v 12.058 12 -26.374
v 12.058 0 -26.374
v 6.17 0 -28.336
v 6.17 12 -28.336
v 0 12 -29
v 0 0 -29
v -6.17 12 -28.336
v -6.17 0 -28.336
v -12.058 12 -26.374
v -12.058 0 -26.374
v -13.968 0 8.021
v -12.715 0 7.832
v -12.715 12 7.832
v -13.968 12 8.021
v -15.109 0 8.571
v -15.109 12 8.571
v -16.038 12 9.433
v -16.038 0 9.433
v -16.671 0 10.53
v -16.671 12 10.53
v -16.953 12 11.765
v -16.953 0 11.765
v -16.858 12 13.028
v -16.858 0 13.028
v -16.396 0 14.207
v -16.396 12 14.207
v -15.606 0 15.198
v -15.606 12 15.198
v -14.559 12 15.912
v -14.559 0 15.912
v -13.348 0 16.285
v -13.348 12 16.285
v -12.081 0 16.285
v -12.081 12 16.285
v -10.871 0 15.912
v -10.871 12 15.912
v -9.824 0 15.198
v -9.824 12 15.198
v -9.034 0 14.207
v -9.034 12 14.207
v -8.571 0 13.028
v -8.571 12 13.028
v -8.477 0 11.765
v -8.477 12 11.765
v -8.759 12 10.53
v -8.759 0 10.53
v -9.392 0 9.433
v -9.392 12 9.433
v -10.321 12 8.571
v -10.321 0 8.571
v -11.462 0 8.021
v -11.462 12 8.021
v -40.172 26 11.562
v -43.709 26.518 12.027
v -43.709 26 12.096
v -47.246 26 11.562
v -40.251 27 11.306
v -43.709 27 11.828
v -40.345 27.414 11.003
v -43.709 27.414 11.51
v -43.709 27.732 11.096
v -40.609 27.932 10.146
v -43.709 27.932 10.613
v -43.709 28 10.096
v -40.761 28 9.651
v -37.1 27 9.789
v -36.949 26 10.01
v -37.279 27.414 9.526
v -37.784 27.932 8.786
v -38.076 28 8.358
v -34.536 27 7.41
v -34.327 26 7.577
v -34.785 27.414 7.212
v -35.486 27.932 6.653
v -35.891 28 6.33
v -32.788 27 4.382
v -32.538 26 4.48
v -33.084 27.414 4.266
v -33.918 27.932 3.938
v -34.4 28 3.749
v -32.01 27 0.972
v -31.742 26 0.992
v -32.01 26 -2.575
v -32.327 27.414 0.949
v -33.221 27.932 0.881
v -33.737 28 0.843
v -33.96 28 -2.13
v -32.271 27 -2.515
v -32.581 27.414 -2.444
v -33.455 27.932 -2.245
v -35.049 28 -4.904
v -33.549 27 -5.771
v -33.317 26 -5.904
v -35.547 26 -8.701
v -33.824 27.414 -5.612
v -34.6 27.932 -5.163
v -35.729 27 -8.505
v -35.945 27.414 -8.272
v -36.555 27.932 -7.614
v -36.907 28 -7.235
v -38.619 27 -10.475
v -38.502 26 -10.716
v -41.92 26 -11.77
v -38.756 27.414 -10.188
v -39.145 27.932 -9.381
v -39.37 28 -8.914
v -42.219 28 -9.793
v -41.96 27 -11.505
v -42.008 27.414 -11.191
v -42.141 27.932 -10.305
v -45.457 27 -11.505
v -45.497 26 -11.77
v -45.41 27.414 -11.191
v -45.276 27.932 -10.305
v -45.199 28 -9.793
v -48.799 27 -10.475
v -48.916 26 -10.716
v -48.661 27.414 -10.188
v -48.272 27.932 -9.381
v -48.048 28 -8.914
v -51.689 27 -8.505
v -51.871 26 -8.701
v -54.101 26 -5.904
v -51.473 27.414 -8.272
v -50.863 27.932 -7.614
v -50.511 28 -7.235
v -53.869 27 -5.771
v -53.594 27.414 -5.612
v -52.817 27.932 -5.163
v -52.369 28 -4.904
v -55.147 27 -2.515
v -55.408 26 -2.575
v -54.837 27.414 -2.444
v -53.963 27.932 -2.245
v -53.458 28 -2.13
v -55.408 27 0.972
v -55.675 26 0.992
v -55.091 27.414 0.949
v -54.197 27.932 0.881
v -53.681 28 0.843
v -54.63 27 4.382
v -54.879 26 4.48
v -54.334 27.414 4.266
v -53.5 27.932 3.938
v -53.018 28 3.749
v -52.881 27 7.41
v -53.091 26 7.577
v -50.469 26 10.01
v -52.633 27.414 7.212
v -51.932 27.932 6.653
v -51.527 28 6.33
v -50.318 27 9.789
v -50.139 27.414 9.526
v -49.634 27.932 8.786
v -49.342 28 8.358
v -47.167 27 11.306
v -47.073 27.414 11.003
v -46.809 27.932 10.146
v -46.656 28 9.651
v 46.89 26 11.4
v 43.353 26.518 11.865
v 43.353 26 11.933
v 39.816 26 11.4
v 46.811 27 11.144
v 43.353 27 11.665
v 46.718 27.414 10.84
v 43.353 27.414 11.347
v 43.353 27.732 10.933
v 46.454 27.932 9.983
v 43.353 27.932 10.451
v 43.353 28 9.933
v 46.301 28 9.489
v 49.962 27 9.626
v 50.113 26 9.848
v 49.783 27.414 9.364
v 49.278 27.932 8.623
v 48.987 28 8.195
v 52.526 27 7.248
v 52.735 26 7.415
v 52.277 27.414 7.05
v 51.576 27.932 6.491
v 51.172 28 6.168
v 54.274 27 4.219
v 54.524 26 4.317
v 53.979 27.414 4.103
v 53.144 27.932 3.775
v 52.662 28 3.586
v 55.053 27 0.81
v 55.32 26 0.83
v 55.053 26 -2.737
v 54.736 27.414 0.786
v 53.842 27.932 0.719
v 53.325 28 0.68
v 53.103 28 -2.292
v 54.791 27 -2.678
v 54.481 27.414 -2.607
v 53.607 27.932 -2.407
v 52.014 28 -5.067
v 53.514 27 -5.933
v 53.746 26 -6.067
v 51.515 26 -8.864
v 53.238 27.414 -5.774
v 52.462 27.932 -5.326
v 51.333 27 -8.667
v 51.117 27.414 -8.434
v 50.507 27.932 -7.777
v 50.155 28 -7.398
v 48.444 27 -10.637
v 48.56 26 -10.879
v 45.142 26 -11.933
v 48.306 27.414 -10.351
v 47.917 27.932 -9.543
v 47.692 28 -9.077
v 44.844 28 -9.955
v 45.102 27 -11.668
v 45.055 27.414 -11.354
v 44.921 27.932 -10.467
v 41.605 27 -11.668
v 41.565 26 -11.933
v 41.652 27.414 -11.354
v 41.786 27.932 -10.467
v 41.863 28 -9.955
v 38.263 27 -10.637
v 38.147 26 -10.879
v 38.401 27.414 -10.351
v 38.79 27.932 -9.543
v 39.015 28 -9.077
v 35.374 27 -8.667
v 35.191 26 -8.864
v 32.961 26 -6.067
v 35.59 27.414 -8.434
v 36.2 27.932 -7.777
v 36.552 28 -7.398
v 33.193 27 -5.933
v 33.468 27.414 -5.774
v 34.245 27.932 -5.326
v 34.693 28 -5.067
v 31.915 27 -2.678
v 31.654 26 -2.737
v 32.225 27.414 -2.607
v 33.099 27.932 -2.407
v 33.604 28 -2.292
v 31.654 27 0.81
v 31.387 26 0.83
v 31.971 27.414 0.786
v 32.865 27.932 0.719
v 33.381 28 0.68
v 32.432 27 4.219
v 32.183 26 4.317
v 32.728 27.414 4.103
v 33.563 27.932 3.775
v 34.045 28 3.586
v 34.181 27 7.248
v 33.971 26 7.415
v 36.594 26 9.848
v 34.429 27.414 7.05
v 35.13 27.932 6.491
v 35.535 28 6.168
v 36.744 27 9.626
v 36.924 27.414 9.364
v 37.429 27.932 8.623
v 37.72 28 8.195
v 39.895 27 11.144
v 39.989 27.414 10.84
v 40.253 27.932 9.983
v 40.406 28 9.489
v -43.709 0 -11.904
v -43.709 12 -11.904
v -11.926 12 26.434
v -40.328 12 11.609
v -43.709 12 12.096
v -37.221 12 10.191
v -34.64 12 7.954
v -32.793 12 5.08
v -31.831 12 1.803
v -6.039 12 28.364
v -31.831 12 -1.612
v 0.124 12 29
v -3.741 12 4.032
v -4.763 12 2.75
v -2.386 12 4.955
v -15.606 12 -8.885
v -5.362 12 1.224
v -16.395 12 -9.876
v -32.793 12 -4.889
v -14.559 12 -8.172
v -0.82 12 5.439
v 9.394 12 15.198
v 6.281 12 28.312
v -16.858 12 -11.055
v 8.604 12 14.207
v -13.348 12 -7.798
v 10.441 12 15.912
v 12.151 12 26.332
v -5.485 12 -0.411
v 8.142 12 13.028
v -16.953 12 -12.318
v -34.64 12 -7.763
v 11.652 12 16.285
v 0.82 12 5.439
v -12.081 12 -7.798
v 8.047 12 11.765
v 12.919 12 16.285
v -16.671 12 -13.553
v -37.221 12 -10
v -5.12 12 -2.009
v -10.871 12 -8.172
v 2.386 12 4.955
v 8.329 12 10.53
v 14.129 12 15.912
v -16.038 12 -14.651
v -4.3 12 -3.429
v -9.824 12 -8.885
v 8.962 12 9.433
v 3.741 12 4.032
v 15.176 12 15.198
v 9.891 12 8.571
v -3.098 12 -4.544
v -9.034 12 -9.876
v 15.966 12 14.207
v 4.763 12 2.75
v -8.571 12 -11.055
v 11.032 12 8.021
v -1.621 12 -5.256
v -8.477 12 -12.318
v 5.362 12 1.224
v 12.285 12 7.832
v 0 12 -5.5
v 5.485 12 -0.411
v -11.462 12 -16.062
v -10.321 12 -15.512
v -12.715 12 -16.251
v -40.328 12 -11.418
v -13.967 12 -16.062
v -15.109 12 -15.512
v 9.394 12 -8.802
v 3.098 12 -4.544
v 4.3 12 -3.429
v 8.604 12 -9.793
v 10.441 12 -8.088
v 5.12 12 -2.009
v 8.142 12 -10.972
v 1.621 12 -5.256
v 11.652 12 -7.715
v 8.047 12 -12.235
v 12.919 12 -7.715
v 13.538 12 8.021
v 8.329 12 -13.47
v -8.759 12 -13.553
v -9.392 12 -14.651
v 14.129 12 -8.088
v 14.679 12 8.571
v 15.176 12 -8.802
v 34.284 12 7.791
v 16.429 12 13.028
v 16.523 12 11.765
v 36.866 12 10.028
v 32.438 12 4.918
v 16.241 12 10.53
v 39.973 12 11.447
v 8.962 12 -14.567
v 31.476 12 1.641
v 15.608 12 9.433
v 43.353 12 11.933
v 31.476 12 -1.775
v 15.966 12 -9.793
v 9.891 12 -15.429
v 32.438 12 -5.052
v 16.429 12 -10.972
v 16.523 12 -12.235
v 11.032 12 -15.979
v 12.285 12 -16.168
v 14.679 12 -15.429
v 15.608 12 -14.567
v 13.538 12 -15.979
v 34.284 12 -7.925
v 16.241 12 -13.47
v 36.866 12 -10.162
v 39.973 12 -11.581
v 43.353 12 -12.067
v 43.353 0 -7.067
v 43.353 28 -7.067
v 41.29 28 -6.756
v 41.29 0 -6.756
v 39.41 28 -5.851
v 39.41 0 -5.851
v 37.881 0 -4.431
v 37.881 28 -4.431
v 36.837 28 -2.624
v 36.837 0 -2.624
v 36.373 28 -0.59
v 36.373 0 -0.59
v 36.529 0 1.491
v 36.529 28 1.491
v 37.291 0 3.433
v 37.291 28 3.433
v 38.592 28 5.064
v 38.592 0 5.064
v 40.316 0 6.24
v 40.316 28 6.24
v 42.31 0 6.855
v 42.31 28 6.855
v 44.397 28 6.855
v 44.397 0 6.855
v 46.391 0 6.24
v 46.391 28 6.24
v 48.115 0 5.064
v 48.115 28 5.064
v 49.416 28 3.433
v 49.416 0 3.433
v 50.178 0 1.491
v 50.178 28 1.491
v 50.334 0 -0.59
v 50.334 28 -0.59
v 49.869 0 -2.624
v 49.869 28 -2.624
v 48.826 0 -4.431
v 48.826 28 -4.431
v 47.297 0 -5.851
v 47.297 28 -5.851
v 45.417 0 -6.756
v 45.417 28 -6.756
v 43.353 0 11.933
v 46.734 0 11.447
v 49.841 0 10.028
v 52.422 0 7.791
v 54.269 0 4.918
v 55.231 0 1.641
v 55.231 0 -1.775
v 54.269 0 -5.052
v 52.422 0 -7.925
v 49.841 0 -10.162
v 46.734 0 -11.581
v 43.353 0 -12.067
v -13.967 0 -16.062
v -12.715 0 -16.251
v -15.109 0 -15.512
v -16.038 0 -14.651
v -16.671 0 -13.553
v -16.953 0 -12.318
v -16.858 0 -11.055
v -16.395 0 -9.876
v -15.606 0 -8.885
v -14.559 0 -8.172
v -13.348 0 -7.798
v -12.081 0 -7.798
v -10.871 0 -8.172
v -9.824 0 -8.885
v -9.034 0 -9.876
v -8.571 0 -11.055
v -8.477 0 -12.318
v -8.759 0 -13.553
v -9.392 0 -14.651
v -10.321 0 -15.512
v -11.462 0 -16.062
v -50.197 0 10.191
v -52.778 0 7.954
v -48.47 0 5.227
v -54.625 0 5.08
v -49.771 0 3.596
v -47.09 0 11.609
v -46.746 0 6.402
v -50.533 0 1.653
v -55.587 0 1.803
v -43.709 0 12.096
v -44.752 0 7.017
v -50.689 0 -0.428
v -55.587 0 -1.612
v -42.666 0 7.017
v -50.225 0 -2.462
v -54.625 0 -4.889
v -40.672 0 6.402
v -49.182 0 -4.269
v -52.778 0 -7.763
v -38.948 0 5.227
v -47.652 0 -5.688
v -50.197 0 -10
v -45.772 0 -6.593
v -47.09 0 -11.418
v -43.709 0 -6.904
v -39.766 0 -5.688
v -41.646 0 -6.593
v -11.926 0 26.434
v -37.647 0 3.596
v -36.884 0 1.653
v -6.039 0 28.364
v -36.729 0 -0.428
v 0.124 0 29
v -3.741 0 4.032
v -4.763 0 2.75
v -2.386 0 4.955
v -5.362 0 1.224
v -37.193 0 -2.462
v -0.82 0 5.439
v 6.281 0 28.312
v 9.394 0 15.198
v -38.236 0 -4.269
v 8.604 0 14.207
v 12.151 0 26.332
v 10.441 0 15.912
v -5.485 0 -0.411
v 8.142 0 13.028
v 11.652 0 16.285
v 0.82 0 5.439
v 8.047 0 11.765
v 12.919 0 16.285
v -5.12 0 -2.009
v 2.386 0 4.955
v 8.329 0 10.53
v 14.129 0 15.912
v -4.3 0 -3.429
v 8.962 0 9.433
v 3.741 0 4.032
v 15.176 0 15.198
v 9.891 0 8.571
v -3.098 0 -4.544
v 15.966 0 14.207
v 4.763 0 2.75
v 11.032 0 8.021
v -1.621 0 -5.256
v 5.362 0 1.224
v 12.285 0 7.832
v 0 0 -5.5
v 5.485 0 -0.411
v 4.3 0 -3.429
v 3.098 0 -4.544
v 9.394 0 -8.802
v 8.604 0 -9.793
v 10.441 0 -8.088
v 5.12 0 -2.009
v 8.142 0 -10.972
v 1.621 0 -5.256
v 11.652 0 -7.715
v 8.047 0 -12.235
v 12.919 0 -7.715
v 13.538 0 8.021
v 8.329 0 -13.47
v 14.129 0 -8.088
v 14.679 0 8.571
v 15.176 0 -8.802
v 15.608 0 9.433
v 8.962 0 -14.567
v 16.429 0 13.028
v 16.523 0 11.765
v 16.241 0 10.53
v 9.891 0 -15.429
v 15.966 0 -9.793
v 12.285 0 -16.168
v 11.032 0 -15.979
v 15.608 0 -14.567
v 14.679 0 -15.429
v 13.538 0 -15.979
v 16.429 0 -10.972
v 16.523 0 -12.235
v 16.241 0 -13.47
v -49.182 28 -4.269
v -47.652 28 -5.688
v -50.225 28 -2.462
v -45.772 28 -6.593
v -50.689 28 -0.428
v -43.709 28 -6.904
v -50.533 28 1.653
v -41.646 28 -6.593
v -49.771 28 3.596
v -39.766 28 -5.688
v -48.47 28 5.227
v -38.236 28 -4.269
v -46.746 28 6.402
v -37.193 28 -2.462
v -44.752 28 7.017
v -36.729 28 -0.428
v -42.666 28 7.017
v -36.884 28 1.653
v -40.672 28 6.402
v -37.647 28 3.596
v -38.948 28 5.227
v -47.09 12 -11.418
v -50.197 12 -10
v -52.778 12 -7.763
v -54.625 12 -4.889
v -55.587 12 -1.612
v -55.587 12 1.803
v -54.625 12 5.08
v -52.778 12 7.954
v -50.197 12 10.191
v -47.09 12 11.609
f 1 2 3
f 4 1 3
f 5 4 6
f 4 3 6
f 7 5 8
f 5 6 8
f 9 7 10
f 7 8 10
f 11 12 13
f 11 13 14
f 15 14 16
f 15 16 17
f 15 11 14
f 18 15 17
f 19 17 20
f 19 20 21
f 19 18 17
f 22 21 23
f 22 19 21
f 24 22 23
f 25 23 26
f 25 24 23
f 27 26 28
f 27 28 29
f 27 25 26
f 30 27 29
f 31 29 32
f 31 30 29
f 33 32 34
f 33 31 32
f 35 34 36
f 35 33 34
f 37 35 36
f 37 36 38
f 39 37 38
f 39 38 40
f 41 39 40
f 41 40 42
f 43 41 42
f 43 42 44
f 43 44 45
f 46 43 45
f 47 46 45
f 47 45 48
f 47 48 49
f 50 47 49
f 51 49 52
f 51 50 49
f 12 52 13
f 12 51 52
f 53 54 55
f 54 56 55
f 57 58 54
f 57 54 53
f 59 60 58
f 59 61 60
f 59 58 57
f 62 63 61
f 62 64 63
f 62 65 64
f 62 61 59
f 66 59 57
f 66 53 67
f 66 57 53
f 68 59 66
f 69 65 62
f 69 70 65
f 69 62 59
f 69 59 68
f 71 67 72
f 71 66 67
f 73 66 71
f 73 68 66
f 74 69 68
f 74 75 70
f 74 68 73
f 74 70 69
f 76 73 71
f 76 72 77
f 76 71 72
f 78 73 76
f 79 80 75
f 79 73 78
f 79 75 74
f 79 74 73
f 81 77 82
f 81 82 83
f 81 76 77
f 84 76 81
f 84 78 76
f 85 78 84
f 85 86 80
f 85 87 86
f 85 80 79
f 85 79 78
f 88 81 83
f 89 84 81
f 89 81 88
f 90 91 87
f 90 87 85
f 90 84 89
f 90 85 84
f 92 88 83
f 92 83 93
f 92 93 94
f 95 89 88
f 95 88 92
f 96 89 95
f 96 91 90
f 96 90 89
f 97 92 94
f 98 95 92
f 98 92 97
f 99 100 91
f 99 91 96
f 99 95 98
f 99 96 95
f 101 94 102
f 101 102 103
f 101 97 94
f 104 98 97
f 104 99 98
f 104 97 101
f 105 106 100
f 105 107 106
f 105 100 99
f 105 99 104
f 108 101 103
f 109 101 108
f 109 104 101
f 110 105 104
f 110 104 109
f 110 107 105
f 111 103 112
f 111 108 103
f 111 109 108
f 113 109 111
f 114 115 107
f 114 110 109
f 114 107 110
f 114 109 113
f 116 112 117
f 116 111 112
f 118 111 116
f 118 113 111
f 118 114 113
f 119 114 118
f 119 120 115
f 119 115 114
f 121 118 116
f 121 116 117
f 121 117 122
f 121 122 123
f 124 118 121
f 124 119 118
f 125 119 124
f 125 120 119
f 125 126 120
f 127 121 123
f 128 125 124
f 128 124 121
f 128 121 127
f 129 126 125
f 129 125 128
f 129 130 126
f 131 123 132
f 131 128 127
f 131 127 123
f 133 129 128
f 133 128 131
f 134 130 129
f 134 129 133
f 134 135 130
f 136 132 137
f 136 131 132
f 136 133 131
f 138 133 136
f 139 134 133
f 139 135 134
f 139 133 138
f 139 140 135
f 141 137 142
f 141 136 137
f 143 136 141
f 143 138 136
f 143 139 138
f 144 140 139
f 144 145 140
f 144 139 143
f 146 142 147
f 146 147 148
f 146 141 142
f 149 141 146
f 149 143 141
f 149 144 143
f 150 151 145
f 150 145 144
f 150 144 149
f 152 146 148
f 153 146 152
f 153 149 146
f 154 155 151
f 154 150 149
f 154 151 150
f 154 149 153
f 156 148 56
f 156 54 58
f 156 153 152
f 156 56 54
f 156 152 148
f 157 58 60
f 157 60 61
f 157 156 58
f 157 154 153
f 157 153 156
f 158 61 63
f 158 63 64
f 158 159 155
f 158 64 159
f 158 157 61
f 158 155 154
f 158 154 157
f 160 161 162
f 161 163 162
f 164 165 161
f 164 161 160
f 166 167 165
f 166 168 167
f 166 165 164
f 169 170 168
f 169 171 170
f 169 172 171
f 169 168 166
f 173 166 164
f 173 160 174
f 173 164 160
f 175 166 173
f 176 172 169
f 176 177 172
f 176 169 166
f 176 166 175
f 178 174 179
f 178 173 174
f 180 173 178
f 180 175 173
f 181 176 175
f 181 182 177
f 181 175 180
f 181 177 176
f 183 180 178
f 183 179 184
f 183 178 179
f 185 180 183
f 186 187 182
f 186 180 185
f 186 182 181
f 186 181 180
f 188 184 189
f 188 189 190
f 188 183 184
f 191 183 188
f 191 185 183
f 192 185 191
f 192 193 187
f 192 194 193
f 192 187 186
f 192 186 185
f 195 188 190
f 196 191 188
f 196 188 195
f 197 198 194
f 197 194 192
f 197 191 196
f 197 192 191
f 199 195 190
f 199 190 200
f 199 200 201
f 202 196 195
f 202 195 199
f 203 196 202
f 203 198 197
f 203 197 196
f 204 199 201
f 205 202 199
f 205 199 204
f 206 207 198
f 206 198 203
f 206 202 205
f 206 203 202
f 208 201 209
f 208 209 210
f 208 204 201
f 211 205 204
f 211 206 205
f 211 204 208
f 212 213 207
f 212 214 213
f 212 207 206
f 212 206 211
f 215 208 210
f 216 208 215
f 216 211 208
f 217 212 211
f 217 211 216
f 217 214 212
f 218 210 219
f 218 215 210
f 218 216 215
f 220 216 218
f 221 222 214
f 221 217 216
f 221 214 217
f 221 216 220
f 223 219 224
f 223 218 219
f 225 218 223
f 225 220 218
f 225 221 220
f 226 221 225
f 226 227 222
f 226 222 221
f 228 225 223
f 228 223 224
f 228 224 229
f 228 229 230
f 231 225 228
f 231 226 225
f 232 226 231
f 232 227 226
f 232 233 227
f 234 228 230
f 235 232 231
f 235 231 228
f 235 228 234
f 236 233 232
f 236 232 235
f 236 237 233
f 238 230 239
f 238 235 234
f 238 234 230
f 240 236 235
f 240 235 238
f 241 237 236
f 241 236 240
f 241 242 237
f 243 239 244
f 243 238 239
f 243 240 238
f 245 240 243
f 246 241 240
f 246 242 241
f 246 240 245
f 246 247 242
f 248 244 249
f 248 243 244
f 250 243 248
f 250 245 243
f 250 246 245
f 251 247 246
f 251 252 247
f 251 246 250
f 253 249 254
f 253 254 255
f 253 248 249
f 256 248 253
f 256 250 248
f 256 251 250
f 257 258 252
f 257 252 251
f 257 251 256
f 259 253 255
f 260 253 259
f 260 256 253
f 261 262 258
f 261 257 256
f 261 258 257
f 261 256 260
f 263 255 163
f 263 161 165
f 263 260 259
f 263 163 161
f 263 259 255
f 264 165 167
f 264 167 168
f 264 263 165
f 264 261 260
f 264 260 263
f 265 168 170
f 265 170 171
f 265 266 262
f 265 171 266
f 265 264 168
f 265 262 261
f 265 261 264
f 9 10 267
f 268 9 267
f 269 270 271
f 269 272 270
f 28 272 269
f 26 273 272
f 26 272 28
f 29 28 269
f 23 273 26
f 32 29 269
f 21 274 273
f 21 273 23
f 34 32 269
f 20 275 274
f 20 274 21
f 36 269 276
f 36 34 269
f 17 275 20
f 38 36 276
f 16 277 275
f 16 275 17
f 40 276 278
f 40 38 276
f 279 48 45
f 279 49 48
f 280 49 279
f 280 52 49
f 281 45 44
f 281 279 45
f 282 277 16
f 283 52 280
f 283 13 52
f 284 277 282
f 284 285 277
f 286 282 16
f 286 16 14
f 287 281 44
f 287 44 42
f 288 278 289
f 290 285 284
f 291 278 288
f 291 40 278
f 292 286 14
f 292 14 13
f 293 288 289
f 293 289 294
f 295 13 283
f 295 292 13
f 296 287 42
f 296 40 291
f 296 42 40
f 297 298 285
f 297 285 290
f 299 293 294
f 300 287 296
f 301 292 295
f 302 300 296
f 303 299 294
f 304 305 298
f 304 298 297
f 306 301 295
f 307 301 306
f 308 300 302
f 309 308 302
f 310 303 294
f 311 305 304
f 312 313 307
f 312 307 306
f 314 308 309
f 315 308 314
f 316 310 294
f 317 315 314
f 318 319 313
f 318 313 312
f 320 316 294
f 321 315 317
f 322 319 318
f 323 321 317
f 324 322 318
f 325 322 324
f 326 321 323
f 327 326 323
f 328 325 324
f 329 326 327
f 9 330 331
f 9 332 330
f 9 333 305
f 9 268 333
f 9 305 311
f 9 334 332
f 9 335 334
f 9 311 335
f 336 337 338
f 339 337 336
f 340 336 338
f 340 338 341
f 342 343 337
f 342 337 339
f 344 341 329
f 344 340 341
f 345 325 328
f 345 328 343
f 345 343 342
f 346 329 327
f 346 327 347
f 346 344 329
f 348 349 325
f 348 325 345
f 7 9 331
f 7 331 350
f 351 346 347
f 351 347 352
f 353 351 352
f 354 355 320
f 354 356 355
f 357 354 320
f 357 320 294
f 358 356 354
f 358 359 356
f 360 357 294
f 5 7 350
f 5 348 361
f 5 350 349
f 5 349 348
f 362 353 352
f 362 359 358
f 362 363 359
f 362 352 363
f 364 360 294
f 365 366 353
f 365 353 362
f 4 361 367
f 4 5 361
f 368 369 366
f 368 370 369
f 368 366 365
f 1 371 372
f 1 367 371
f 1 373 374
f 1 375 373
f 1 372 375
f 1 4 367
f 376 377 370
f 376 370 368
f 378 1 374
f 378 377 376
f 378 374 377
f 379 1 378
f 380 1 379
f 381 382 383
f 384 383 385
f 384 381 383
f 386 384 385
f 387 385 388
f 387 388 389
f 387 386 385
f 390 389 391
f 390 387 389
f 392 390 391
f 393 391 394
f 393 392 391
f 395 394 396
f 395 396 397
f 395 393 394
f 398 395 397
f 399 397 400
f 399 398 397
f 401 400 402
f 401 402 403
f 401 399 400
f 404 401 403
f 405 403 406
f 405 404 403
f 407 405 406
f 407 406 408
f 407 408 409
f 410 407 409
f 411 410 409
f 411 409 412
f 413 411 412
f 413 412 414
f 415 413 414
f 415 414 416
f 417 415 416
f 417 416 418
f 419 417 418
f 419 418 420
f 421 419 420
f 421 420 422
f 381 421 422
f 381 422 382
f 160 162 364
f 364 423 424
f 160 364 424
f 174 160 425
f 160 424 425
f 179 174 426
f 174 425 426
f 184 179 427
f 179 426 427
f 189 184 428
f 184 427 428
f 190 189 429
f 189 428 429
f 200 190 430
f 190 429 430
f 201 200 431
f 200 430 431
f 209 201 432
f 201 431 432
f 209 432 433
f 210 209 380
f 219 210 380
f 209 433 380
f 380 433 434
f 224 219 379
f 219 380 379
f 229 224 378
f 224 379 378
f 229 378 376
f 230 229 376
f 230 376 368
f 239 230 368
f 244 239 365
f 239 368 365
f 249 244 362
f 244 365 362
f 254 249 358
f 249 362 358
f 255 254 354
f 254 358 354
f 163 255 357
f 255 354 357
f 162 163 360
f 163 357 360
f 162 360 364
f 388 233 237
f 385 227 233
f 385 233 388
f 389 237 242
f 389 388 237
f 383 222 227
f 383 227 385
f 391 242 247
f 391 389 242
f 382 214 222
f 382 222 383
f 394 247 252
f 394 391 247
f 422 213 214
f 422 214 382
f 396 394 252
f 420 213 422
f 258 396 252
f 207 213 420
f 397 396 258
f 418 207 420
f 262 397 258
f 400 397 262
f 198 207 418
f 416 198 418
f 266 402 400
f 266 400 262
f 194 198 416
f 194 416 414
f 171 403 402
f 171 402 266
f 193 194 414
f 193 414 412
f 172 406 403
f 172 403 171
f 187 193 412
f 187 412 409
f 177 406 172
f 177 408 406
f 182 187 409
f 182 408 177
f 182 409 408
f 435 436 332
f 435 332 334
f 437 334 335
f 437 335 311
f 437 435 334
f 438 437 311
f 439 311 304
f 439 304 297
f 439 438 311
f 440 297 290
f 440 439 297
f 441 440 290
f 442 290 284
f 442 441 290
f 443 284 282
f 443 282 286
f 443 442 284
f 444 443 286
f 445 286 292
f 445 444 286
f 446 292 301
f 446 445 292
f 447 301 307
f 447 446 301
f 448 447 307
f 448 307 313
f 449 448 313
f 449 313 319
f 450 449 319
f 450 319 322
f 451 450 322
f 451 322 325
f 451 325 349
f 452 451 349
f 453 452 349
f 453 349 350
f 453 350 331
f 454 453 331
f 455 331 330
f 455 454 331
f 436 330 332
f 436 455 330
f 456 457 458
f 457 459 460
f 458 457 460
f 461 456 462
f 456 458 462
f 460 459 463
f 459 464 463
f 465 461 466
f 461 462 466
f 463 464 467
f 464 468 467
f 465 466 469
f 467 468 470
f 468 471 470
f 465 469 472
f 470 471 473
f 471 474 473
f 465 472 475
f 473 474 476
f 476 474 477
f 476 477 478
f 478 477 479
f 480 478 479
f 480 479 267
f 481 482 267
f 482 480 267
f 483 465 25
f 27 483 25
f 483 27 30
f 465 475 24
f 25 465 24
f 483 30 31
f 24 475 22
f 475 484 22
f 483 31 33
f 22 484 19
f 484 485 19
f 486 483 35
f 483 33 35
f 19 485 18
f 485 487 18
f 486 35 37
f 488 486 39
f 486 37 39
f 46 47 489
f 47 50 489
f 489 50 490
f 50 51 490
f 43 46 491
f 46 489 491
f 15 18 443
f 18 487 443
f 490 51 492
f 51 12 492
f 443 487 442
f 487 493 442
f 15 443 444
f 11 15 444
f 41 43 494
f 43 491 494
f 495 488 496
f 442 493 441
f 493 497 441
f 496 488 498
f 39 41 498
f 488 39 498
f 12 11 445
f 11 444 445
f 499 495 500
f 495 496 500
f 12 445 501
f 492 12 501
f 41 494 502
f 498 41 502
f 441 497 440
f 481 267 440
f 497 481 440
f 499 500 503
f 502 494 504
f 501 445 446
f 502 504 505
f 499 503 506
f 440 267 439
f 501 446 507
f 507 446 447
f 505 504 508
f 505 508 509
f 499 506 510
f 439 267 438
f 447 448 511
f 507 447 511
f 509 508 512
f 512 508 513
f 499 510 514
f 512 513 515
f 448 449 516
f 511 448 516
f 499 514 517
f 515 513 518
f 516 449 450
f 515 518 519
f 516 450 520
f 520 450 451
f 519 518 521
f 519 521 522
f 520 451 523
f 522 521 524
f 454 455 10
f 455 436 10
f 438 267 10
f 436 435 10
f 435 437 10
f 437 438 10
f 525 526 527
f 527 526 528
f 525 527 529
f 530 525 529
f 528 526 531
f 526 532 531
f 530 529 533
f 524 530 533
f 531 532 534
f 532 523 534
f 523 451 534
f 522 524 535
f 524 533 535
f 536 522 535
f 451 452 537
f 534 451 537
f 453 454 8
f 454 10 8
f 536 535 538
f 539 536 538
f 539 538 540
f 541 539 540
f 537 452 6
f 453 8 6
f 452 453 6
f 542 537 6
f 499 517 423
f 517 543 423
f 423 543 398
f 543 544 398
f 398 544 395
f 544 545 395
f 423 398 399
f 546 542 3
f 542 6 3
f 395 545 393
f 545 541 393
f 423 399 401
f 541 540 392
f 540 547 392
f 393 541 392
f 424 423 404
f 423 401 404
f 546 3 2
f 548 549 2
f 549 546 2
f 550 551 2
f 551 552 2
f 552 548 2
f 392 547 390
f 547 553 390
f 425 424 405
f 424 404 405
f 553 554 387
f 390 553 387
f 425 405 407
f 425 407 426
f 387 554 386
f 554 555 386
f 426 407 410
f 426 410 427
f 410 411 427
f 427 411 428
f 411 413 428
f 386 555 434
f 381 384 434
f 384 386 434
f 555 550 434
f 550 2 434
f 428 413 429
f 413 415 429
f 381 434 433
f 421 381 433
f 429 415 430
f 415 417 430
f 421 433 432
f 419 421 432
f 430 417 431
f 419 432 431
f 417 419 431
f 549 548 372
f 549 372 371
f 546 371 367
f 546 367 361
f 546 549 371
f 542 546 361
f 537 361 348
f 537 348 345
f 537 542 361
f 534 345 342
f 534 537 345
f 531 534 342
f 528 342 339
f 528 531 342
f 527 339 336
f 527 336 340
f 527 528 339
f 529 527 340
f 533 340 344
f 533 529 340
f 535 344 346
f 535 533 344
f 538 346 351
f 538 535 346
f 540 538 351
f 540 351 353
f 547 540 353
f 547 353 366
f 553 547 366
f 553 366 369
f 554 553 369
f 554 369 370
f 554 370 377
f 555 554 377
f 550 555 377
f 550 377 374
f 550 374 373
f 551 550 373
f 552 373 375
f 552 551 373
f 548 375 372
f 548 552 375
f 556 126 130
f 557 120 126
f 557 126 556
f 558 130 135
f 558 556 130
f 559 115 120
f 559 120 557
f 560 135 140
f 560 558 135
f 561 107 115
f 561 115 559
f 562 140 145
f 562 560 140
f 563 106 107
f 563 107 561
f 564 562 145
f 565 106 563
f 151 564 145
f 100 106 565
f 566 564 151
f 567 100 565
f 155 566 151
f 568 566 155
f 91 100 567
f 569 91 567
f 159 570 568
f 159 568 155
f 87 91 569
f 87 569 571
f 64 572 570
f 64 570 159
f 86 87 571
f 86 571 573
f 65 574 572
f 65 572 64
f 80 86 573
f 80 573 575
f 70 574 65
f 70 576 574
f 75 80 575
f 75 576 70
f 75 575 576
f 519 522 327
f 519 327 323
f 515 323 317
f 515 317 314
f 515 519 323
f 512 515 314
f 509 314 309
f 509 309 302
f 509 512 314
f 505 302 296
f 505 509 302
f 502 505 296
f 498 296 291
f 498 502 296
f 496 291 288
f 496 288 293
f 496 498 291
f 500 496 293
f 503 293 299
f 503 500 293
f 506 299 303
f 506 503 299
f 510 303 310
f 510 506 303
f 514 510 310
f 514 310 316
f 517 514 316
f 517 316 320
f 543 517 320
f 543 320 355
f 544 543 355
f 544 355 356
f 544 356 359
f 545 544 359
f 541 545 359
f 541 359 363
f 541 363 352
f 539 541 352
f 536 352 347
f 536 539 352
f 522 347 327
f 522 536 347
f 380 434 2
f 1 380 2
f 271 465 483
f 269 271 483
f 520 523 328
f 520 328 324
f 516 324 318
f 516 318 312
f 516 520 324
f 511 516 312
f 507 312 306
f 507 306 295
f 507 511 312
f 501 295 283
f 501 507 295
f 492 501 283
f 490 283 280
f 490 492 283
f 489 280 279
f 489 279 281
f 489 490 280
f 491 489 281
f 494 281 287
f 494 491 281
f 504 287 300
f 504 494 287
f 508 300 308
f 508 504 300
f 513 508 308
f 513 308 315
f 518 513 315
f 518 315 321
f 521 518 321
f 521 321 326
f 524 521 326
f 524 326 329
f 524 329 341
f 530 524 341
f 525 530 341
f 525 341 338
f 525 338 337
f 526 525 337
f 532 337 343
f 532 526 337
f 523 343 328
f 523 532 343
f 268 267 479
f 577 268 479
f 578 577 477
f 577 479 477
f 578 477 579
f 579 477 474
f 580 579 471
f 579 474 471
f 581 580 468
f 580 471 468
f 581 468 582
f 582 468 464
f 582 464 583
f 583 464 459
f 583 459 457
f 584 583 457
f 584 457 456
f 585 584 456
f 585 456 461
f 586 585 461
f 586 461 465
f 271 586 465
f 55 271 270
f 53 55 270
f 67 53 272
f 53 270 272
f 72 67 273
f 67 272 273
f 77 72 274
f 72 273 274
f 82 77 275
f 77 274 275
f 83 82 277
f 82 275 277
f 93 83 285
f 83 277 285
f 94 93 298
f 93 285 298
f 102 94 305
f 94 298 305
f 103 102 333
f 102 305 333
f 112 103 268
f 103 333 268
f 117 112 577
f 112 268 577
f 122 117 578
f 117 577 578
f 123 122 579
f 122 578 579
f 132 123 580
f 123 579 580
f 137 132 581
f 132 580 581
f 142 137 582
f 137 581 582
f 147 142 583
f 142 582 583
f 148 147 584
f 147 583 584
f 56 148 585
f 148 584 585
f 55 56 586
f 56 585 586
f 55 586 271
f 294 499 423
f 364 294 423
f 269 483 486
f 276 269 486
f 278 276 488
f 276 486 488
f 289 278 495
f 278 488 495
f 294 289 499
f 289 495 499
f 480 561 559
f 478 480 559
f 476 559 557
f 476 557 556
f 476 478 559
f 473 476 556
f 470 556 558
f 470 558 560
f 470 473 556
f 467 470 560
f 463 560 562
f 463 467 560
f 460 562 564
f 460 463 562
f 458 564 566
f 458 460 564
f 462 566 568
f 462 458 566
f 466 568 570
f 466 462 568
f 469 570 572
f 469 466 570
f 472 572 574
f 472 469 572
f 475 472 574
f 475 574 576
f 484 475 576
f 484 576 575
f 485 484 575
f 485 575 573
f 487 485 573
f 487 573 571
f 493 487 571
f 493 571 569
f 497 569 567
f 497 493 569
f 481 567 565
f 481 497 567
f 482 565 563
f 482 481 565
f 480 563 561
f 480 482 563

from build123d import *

# Parameters (mm, degrees)
ESBO_O2_R                = 4.25
ESBO_O2_R_2              = 5.5
ESBO_O2_R_3              = 7
RESSALTO_EXTRUS_O2_DEPTH = 12
ESBO_O3_R                = 12
ESBO_O3_R_2              = 7
RESSALTO_EXTRUS_O3_DEPTH = 16
FILETE1_R                = 2


with BuildPart() as part:
    # Esboço2 → Ressalto-extrusão2 (new body)
    with BuildSketch(Plane(origin=(0, 0, 0), x_dir=(1, 0, 0), z_dir=(0, 1, 0))):
        with BuildLine():
            Line((-12.057610331, 26.374495883), (-43.708926586, 11.904485175))
            ThreePointArc((-43.708926586, 11.904485175), (-55.708926586, -0.095514825), (-43.708926586, -12.095514825))
            Line((-43.708926586, -12.095514825), (-11.925771547, -26.434371054))
            ThreePointArc((-11.925771547, -26.434371054), (0.12376622, -28.999735894), (12.150968312, -26.331615391))
            Line((12.150968312, -26.331615391), (43.35338336, -11.93297137))
            ThreePointArc((43.35338336, -11.93297137), (55.35338336, 0.06702863), (43.35338336, 12.06702863))
            Line((43.35338336, 12.06702863), (12.057610331, 26.374495883))
            ThreePointArc((12.057610331, 26.374495883), (0, 29), (-12.057610331, 26.374495883))
        make_face()
        with Locations(Location((-12.714926554, -12.082390656, 0), (0, 0, 90))):
            Circle(ESBO_O2_R, mode=Mode.SUBTRACT)
        with Locations(Location((12.285073446, -12.082390656, 0), (0, 0, 90))):
            Circle(ESBO_O2_R, mode=Mode.SUBTRACT)
        with Locations(Location((0, 0, 0), (0, 0, 90))):
            Circle(ESBO_O2_R_2, mode=Mode.SUBTRACT)
        with Locations(Location((-12.714788426, 12.000714001, 0), (0, 0, 90))):
            Circle(ESBO_O2_R, mode=Mode.SUBTRACT)
        with Locations(Location((12.285073446, 11.917609344, 0), (0, 0, 90))):
            Circle(ESBO_O2_R, mode=Mode.SUBTRACT)
        with Locations(Location((-43.708926586, -0.095514825, 0), (0, 0, 90))):
            Circle(ESBO_O2_R_3, mode=Mode.SUBTRACT)
        with Locations(Location((43.35338336, 0.06702863, 0), (0, 0, 90))):
            Circle(ESBO_O2_R_3, mode=Mode.SUBTRACT)
    extrude(amount=RESSALTO_EXTRUS_O2_DEPTH)

    # Esboço3 → Ressalto-extrusão3 (add)
    # profile 1 of 2: a face of its own
    with BuildSketch(Plane(origin=(0, 12, 0), x_dir=(1, 0, 0), z_dir=(0, 1, 0))):
        with Locations(Location((-43.708926586, -0.095514825, 0), (0, 0, 270))):
            Circle(ESBO_O3_R)
        with Locations(Location((-43.708926586, -0.095514825, 0), (0, 0, 90))):
            Circle(ESBO_O3_R_2, mode=Mode.SUBTRACT)
    # profile 2 of 2: a face of its own
    with BuildSketch(Plane(origin=(0, 12, 0), x_dir=(1, 0, 0), z_dir=(0, 1, 0))):
        with Locations(Location((43.35338336, 0.06702863, 0), (0, 0, 270))):
            Circle(ESBO_O3_R)
        with Locations(Location((43.35338336, 0.06702863, 0), (0, 0, 90))):
            Circle(ESBO_O3_R_2, mode=Mode.SUBTRACT)
    extrude(amount=RESSALTO_EXTRUS_O3_DEPTH)

    # Filete1
    filete1_edges = [part.edges().sort_by_distance(p)[0] for p in [
        (-43.708926586, 28, -11.904485175),
        (43.35338336, 28, -12.06702863),
    ]]
    fillet(filete1_edges, radius=FILETE1_R)


solid = part.part
